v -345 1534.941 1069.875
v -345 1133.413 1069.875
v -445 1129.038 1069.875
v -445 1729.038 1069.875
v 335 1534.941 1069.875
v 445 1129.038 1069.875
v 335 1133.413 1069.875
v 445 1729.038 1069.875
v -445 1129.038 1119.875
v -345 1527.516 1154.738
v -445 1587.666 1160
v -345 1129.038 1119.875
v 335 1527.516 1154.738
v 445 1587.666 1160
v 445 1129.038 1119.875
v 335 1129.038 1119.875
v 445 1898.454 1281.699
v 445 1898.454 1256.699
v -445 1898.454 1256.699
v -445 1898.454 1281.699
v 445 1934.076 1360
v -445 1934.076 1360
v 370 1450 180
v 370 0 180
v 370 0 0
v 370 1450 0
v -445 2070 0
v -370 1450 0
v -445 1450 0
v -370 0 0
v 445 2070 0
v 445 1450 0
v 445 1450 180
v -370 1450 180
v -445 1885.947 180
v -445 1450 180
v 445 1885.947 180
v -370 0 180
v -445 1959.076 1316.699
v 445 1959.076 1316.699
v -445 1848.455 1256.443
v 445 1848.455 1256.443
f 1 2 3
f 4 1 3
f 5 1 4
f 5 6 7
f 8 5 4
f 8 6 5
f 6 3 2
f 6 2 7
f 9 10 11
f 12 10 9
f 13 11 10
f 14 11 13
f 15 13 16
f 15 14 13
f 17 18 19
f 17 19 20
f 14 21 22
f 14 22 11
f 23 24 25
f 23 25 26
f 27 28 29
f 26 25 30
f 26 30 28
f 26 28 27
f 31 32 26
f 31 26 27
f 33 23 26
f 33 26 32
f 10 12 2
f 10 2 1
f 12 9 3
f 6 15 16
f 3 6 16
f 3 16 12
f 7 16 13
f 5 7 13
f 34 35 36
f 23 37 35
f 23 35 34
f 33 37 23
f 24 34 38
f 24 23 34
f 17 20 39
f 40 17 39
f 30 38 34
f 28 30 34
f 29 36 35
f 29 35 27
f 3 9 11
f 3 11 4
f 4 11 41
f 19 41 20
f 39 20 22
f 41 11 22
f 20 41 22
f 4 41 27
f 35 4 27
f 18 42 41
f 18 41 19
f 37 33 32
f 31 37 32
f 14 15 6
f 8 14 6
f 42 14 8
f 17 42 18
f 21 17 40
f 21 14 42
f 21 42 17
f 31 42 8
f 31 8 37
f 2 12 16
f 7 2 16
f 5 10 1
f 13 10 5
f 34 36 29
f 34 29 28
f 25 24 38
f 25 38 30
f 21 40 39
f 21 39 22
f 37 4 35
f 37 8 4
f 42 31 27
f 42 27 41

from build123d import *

# Parameters (mm, degrees)
F1_DEPTH = 445
F2_W     = 680
F2_H     = 400
F3_DEPTH = 86.1864572875
F4_W     = 75
F4_H     = 1450
F5_DEPTH = 180.001


with BuildPart() as f1:
    # F0 (on Right) → F1 (new body, symmetric)
    with BuildSketch(Plane.YZ):
        Polygon((0, 180), (0, 0), (2070, 0), (1848.4551352237, 1256.4433638354), (1898.4544831016, 1256.6987298108), (1898.4544831016, 1281.6987298108), (1959.0762613666, 1316.6987298108), (1934.0762613666, 1360), (1587.6660998528, 1160), (1129.0381352408, 1119.8752523205), (1129.0381352408, 1069.8752523205), (1729.0381352408, 1069.8752523205), (1885.9471516896, 180), align=None)
    extrude(amount=F1_DEPTH, both=True)

    # F2 (on face) → F3 (cut, up to face)
    with BuildSketch(Plane(origin=(0, -88.6558352853, 1013.3408342556), x_dir=(1, 0, 0), z_dir=(0, -0.0871557427, 0.9961946981))):
        with Locations((-5, 1422.3453636709)):
            Rectangle(F2_W, F2_H)
    extrude(amount=-F3_DEPTH, mode=Mode.SUBTRACT)

    # F4 (on face) → F5 (cut, through all)
    with BuildSketch(Plane.XY.offset(180)):
        with Locations((-407.5, 725)):
            Rectangle(F4_W, F4_H)
        with Locations((407.5, 725)):
            Rectangle(F4_W, F4_H)
    extrude(amount=-F5_DEPTH, mode=Mode.SUBTRACT)


solid = f1.part
